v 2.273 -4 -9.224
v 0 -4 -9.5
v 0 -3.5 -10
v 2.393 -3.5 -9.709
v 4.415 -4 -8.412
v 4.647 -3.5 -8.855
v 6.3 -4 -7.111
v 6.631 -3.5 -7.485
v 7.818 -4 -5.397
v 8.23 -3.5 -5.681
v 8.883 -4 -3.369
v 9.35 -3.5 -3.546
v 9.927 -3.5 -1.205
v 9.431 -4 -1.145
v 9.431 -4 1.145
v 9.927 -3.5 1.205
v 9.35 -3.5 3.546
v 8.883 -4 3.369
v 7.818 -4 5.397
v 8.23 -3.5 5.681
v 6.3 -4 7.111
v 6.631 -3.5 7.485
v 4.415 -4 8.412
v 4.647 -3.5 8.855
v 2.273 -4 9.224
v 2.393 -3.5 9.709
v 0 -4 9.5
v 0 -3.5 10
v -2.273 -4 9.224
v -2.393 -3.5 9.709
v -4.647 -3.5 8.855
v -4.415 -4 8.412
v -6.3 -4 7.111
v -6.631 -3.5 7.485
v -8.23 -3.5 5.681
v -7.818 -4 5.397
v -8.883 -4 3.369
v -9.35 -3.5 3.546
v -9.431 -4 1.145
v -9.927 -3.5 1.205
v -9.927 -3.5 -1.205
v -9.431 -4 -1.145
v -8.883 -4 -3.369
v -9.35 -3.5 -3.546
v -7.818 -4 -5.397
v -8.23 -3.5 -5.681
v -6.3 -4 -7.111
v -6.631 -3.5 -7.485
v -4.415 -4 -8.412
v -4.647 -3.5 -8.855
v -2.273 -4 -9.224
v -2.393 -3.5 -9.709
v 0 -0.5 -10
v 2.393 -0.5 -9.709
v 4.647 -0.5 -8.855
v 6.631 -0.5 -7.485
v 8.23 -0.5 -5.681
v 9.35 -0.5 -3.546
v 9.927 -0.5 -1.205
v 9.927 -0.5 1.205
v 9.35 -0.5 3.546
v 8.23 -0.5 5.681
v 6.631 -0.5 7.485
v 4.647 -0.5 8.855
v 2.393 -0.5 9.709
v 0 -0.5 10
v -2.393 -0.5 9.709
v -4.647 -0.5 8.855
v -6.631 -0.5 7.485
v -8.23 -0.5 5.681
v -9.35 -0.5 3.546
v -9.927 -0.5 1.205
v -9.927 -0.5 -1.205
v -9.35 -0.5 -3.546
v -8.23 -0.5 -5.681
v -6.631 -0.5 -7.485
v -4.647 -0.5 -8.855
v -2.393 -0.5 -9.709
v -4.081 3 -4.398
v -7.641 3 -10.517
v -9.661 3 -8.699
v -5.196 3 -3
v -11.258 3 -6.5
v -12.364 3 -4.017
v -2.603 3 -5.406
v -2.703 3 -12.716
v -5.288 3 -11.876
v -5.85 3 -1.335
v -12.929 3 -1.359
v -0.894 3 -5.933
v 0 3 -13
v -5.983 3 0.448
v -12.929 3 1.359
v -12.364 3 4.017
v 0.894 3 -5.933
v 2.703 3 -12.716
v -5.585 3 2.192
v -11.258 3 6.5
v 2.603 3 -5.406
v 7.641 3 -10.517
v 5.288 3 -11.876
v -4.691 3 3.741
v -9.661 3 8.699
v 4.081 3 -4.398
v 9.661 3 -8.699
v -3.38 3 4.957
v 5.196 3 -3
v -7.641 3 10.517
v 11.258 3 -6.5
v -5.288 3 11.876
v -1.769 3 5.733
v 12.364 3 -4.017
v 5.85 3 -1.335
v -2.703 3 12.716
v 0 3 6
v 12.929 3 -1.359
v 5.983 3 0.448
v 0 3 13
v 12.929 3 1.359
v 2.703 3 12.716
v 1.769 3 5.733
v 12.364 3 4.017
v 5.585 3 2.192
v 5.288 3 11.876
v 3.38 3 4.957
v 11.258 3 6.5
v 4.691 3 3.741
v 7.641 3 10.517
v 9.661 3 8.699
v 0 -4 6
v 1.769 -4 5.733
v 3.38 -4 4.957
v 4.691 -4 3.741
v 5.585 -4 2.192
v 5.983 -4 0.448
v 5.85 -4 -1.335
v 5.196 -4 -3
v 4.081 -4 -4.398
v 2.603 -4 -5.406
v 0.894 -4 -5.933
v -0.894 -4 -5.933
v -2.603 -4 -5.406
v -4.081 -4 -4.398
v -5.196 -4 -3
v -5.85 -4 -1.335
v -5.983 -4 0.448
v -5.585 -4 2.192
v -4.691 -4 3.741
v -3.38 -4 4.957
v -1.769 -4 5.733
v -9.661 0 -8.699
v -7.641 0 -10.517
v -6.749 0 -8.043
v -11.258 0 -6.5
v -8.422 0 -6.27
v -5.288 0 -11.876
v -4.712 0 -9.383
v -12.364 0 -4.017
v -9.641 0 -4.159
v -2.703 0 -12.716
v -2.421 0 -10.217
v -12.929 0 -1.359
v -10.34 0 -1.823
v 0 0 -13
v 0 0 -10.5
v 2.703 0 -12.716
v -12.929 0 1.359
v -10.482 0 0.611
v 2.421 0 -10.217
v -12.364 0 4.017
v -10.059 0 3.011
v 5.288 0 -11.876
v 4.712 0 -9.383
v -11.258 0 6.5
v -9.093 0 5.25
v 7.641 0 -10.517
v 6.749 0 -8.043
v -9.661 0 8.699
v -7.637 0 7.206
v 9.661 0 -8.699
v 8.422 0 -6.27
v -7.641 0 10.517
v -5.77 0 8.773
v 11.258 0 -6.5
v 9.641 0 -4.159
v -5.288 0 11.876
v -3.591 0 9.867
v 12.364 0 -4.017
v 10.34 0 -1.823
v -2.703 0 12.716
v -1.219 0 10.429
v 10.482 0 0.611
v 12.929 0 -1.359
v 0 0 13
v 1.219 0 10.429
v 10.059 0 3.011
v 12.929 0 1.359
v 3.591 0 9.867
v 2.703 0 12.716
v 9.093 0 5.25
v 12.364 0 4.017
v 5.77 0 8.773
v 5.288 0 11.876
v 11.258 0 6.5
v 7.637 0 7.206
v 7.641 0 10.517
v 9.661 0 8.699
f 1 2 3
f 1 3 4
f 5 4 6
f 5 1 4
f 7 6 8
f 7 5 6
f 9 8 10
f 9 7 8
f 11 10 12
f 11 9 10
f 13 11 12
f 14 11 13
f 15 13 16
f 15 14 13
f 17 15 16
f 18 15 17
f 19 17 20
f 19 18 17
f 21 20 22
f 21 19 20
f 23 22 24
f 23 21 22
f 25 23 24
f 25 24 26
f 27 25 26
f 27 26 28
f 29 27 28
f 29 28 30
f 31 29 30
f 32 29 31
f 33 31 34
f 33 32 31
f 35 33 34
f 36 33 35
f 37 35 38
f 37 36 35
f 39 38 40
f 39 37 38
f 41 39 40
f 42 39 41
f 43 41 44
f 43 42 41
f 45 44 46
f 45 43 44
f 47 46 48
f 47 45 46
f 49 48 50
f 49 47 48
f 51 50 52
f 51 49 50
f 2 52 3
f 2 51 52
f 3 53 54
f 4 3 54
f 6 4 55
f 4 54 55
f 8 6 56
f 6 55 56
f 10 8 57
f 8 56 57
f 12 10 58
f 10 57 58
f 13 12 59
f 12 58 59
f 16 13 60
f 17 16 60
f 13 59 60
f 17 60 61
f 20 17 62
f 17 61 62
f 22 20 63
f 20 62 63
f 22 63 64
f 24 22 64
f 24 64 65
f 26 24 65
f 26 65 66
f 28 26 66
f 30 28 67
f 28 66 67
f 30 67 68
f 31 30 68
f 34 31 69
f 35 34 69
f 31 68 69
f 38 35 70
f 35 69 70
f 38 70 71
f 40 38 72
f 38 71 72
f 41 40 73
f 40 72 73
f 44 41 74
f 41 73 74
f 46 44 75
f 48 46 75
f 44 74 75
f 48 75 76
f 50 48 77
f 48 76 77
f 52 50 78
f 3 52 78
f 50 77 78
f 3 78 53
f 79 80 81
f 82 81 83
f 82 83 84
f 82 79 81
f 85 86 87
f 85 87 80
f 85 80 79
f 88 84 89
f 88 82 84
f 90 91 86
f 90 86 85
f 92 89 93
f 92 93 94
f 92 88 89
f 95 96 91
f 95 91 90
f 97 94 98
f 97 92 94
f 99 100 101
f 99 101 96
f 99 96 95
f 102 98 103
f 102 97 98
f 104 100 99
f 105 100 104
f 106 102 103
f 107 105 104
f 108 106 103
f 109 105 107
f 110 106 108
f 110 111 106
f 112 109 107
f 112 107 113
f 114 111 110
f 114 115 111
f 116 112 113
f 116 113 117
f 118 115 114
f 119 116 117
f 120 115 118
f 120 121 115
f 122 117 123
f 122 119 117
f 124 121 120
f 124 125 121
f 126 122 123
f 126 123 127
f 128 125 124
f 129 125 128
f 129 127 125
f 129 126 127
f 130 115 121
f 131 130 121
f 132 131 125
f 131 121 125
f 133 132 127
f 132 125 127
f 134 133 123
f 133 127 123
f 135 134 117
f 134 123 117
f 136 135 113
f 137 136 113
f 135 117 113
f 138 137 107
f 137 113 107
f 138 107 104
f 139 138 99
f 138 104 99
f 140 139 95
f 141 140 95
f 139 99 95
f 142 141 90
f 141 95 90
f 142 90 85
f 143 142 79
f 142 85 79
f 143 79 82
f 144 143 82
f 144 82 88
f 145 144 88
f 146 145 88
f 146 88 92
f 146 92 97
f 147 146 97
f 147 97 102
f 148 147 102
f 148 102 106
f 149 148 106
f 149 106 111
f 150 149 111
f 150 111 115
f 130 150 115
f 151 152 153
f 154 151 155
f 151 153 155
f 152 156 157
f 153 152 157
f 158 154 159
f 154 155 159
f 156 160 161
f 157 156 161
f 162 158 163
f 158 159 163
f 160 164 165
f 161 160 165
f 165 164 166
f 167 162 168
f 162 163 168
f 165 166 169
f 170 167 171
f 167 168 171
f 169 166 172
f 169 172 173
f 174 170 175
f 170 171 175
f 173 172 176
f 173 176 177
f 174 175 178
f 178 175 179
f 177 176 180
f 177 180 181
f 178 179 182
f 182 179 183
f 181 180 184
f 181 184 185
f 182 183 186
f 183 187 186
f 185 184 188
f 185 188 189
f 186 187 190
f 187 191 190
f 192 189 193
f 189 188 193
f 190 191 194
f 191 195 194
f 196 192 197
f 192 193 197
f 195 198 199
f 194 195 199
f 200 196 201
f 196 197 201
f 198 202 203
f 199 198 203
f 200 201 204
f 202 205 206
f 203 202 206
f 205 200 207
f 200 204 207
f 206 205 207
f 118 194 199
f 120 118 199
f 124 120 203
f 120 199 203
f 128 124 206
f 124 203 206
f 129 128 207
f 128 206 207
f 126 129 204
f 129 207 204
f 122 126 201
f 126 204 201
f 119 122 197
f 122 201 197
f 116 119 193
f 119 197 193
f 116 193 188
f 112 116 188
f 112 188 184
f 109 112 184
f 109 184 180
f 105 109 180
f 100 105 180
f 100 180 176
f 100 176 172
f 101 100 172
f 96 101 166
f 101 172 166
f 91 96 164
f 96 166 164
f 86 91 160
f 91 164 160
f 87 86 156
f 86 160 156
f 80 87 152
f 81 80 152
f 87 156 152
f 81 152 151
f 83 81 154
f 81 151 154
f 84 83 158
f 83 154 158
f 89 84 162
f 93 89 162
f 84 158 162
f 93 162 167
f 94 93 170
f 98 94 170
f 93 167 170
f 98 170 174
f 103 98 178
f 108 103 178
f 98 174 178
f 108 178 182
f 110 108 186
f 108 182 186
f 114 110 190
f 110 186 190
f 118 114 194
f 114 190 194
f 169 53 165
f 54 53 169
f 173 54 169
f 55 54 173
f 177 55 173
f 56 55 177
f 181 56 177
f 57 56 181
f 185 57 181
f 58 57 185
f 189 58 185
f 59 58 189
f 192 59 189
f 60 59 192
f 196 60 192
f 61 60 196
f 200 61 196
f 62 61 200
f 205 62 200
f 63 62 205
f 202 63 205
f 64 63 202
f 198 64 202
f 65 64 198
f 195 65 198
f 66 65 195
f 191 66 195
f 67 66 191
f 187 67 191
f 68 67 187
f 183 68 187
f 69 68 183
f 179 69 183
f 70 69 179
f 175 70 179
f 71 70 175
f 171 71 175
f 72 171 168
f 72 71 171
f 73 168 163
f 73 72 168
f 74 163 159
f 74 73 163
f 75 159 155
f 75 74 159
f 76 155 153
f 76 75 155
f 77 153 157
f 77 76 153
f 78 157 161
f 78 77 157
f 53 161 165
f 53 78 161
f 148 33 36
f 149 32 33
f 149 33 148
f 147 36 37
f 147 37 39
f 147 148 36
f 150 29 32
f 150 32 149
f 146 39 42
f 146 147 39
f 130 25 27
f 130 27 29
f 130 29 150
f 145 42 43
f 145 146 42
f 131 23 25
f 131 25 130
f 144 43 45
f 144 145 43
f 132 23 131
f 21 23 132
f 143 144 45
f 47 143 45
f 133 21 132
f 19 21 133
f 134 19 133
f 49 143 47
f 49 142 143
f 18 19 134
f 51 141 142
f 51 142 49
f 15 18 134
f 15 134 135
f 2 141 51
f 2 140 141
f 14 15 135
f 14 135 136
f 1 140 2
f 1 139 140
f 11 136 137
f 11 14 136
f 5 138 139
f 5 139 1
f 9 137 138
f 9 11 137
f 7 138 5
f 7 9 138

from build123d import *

# Parameters (mm, degrees)
SKETCH1_R           = 13
BOSS_EXTRUDE1_DEPTH = 3
SKETCH2_R           = 10
BOSS_EXTRUDE2_DEPTH = 4
CHAMFER1_SIZE       = 0.5
SKETCH3_R           = 6
CUT_EXTRUDE1_DEPTH  = 20.672315573


with BuildPart() as part:
    # Sketch1 → Boss-Extrude1 (new body)
    with BuildSketch(Plane(origin=(0, 0, 0), x_dir=(1, 0, 0), z_dir=(0, 1, 0))):
        with Locations(Location((0, 0, 0), (0, 0, 270))):
            Circle(SKETCH1_R)
    extrude(amount=BOSS_EXTRUDE1_DEPTH)

    # Sketch2 → Boss-Extrude2 (add)
    with BuildSketch(Plane.XZ):
        with Locations(Location((0, 0, 0), (0, 0, 270))):
            Circle(SKETCH2_R)
    extrude(amount=BOSS_EXTRUDE2_DEPTH)

    # Chamfer1
    chamfer1_edges = [part.edges().sort_by_distance(p)[0] for p in [
        (0, 0, 10),
        (0, -4, 10),
    ]]
    chamfer(chamfer1_edges, length=CHAMFER1_SIZE)

    # Sketch3 → Cut-Extrude1 (cut, through all)
    with BuildSketch(Plane(origin=(0, 3, 0), x_dir=(1, 0, 0), z_dir=(0, 1, 0))):
        with Locations(Location((0, 0, 0), (0, 0, 270))):
            Circle(SKETCH3_R)
    extrude(amount=-CUT_EXTRUDE1_DEPTH, mode=Mode.SUBTRACT)


solid = part.part
